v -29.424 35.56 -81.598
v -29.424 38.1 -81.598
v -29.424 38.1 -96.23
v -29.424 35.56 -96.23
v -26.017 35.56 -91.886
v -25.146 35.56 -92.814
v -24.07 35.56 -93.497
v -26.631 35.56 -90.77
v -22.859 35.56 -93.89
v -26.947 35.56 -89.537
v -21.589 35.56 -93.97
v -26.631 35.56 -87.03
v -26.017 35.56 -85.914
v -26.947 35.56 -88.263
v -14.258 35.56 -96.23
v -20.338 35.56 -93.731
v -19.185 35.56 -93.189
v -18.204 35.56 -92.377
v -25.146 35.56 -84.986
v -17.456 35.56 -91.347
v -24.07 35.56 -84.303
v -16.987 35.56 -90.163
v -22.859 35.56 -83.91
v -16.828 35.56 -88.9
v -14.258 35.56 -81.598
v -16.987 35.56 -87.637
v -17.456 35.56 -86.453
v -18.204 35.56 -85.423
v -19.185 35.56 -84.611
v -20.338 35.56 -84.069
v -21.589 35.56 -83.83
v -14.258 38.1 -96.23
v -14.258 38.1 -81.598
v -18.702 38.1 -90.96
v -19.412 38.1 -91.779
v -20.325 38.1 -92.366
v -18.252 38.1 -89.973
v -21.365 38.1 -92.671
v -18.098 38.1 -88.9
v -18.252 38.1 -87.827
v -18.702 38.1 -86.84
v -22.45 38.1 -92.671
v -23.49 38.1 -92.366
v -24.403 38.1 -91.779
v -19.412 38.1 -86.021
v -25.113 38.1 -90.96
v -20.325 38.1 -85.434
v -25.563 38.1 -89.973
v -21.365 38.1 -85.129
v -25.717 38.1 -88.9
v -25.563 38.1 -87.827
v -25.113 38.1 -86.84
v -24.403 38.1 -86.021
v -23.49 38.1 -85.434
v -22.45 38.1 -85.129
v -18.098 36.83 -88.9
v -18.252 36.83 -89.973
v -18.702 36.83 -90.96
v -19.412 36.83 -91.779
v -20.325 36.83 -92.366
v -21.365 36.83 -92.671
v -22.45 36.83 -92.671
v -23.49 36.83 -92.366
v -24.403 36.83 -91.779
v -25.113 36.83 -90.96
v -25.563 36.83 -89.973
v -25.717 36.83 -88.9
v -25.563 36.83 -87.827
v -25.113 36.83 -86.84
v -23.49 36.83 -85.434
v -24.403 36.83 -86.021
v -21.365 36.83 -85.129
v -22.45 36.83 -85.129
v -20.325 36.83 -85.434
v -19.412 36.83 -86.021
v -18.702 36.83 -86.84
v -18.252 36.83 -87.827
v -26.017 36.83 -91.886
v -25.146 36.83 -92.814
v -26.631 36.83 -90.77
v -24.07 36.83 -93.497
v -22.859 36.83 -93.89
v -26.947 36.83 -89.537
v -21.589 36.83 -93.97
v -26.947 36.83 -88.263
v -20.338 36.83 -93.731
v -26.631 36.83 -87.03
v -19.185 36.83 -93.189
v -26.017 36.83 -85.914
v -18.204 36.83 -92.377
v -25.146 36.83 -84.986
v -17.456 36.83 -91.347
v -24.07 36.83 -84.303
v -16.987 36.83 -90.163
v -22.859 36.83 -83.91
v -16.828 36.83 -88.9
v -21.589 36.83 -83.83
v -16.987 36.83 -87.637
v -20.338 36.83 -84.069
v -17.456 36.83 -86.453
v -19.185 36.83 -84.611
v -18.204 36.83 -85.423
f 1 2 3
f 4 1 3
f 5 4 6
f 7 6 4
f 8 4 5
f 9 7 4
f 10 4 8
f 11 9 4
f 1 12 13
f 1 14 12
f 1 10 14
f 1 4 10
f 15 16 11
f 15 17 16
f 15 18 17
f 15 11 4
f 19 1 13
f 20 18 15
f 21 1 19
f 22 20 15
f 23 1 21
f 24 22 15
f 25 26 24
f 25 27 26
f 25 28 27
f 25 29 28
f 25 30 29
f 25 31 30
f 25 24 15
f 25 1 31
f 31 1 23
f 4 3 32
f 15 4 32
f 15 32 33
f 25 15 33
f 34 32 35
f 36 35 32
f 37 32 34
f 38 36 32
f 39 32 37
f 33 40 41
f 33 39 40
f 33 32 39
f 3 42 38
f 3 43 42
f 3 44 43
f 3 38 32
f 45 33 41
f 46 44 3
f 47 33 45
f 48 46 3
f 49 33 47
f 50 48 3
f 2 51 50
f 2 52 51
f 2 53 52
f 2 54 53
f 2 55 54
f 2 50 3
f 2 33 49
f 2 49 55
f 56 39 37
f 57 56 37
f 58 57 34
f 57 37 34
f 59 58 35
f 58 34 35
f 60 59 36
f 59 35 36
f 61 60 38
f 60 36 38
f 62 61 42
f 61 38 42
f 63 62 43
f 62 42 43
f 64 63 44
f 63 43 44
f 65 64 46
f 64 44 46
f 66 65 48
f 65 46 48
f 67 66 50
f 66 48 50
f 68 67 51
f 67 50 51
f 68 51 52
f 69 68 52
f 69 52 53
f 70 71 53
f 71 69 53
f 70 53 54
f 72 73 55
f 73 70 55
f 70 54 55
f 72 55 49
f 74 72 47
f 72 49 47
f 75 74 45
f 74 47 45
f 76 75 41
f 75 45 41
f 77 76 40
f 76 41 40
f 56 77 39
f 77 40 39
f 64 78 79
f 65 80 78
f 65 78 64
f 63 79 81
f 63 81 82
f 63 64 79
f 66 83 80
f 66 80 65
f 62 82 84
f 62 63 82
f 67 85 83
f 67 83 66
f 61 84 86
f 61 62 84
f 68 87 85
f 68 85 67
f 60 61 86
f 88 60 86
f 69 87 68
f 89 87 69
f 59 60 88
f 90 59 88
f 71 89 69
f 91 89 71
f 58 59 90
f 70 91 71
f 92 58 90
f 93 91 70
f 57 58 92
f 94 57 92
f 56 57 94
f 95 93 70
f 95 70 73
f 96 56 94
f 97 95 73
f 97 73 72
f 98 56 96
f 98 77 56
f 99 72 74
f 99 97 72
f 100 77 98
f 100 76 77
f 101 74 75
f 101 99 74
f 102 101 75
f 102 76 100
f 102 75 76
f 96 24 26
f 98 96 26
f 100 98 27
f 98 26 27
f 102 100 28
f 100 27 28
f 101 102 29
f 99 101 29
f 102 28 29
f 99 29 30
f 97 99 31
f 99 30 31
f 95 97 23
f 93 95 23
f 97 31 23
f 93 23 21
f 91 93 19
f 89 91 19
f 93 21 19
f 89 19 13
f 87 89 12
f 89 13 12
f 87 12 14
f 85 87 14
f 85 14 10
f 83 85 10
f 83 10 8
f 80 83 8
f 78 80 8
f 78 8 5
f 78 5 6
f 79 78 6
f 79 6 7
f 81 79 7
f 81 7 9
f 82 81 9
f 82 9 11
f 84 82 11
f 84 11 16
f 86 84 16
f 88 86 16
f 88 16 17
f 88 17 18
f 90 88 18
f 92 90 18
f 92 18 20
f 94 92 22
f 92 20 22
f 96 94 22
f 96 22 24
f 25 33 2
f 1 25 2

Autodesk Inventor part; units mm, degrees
ref_plane "YZ Plane" through (0, 0, 0) normal (1, 0, 0) x (0, 1, 0)
ref_plane "XZ Plane" through (0, 0, 0) normal (0, 1, 0) x (-1, 0, 0)
ref_plane "XY Plane" through (0, 0, 0) normal (0, 0, 1) x (1, 0, 0)
sketch "Sketch1" plane through (0, 0, 0) normal (0, 1, 0) x (-1, 0, 0)
  line L0 (0, 0) -> (177.8, 0)
  line L1 (177.8, 0) -> (177.8, -114.3)
  line L2 (177.8, -114.3) -> (0, -114.3)
  line L3 (0, -114.3) -> (0, 0)
  dimension "d0" = 177.8
  dimension "d1" = 114.3
extrude "Extrusion1" add sketch "Sketch1" along normal blind 38.1
sketch "Sketch2" plane through (0, 0, 0) normal (0, -1, 0) x (1, 0, 0)
  line L0 (-177.8, -114.3) -> (-177.8, 0) projected
  line L1 (0, 0) -> (-177.8, 0)
  line L2 (-177.8, 0) -> (-177.8, -114.3)
  line L3 (-177.8, -114.3) -> (0, -114.3)
  line L4 (0, -114.3) -> (0, 0)
  line L5 (-5.08, -5.08) -> (-172.72, -5.08)
  line L6 (-172.72, -5.08) -> (-172.72, -109.22)
  line L7 (-172.72, -109.22) -> (-5.08, -109.22)
  line L8 (-5.08, -109.22) -> (-5.08, -5.08)
  dimension "d4" = 5.08
extrude "Extrusion2" cut sketch "Sketch2" against normal blind 35.56 contours L8 L7 L6 L5
fillet "Fillet1" radius 3.175 4 edges at (-177.8, 38.1, -57.15) (-88.9, 38.1, 0) (-88.9, 38.1, -114.3) (0, 38.1, -57.15)
sketch "Sketch3" plane through (0, 38.1, 0) normal (0, 1, 0) x (1, 0, 0)
  line L0 (-177.8, 114.3) -> (-171.45, 114.3)
  line L1 (-171.45, 114.3) -> (-171.45, 0)
  line L2 (-171.45, 0) -> (-177.8, 0)
  line L3 (-177.8, 0) -> (-177.8, 114.3)
  line L4 (0, 114.3) -> (-177.8, 114.3) projected
  line L5 (-177.8, 114.3) -> (0, 114.3)
  line L6 (0, 114.3) -> (0, 107.95)
  line L7 (0, 107.95) -> (-177.8, 107.95)
  line L8 (-177.8, 107.95) -> (-177.8, 114.3)
  line L9 (-158.75, 100.4887) -> (-100.6475, 100.4887)
  line L10 (-100.6475, 100.4887) -> (-100.6475, 13.8112)
  line L11 (-100.6475, 13.8112) -> (-158.75, 13.8112)
  line L12 (-158.75, 13.8112) -> (-158.75, 100.4887)
  point P0 (0, 0)
  dimension "d8" = 6.35
  dimension "d9" = 6.35
  dimension "d10" = 58.1025
  dimension "d11" = 86.6775
  dimension "d12" = 13.8112
  dimension "d13" = 19.05
extrude "Extrusion3" cut sketch "Sketch3" against normal blind 35.56 contours L9 L10 L11 L12
sketch "Sketch4" plane through (0, 38.1, 0) normal (0, 1, 0) x (1, 0, 0)
  line L0 (-94.2975, 17.78) -> (-81.2088, 17.78)
  line L1 (-91.7575, 20.32) -> (-91.7575, 26.67)
  line L2 (-91.7575, 26.67) -> (-94.2975, 26.67)
  line L3 (-94.2975, 26.67) -> (-94.2975, 17.78)
  line L4 (-94.2975, 17.78) -> (-78.6765, 17.78)
  line L5 (-78.6765, 17.78) -> (-78.6765, 20.32)
  line L6 (-94.2975, 24.2647) -> (-94.2975, 17.78)
  line L7 (-85.6615, 20.32) -> (-85.6615, 24.13)
  line L8 (-85.6615, 24.13) -> (-88.2015, 24.13)
  line L9 (-88.2015, 24.13) -> (-88.2015, 20.32)
  line L10 (-78.6765, 20.32) -> (-85.6615, 20.32)
  line L11 (-88.2015, 20.32) -> (-91.7575, 20.32)
  line L12 (-100.6475, 100.4887) -> (-100.6475, 13.8112) projected
  line L13 (-177.8, 0) -> (0, 0) projected
  line L14 (-94.2975, 27.94) -> (-78.6765, 27.94)
  line L15 (-78.6765, 27.94) -> (-78.6765, 30.7699)
  line L16 (-81.2165, 30.48) -> (-94.2975, 30.48)
  line L17 (-94.2975, 30.48) -> (-94.2975, 27.94)
  line L18 (-83.0828, 27.94) -> (-78.6765, 27.94)
  line L19 (-78.6765, 27.94) -> (-78.6765, 36.83)
  line L20 (-78.6765, 36.83) -> (-81.2165, 36.83)
  line L21 (-81.2165, 36.83) -> (-81.2165, 30.48)
  ellipse E0 centre (-86.487, 41.91) end of major axis (-94.2975, 41.91) minor radius 5.334
  ellipse E1 centre (-86.487, 53.34) end of major axis (-94.2975, 53.34) minor radius 5.334
  line L22 (-94.2975, 60.96) -> (-78.6765, 60.96)
  line L23 (-78.6765, 60.96) -> (-78.6765, 63.754)
  line L24 (-94.2975, 63.754) -> (-94.2975, 60.96)
  ellipse E2 centre (-86.487, 63.754) end of major axis (-94.2975, 63.754) minor radius 7.62 (-78.6765, 63.754) -> (-94.2975, 63.754) ccw
  line L25 (-91.7575, 63.754) -> (-91.7575, 63.5)
  line L26 (-91.7575, 63.5) -> (-81.2165, 63.5)
  line L27 (-81.2165, 63.5) -> (-81.2165, 63.754)
  line L28 (-94.2975, 82.55) -> (-78.6765, 82.55)
  line L29 (-78.6765, 82.55) -> (-78.6765, 80.01)
  line L30 (-78.6765, 80.01) -> (-94.2975, 80.01)
  line L31 (-94.2975, 80.01) -> (-94.2975, 82.55)
  line L32 (-91.7575, 89.535) -> (-78.6765, 89.535)
  line L33 (-78.6765, 89.535) -> (-78.6765, 92.075)
  line L34 (-78.6765, 92.075) -> (-91.7575, 92.075)
  line L35 (-94.2975, 94.8241) -> (-94.2975, 91.9305)
  line L36 (-94.2975, 85.09) -> (-91.7575, 85.09)
  line L37 (-91.7575, 96.52) -> (-94.2975, 96.52)
  line L38 (-94.2975, 96.52) -> (-94.2975, 85.09)
  line L39 (-91.7575, 85.09) -> (-91.7575, 89.535)
  line L40 (-91.7575, 92.075) -> (-91.7575, 96.52)
  spline S0 degree 5 poles (-91.7575, 41.91) (-91.7584, 41.6813) (-91.6944, 41.4527) (-91.5885, 41.2473) (-91.2042, 40.6846) (-90.6636, 40.2564) (-90.282, 40.0177) (-89.3306, 39.5478) (-88.3046, 39.2718) (-87.7026, 39.1679) (-86.487, 39.0641) (-85.2714, 39.1679) (-84.6694, 39.2718) (-83.6435, 39.5478) (-82.692, 40.0176) (-82.3107, 40.2563) (-81.7696, 40.6845) (-81.3858, 41.2473) (-81.2787, 41.4526) (-81.1539, 41.91) (-81.2787, 42.3674) (-81.3858, 42.5727) (-81.7696, 43.1355) (-82.3107, 43.5637) (-82.692, 43.8024) (-83.6435, 44.2722) (-84.6694, 44.5482) (-85.2714, 44.6521) (-86.487, 44.7559) (-87.7026, 44.6521) (-88.3046, 44.5482) (-89.3306, 44.2722) (-90.282, 43.8023) (-90.6636, 43.5636) (-91.2042, 43.1354) (-91.5885, 42.5727) (-91.6944, 42.3673) (-91.7584, 42.1387) (-91.7575, 41.91) knots 0 0 0 0 0 0 0.044471 0.044471 0.044471 0.131758 0.131758 0.131758 0.25 0.25 0.25 0.36824 0.36824 0.36824 0.455522 0.455522 0.455522 0.5 0.5 0.5 0.544478 0.544478 0.544478 0.63176 0.63176 0.63176 0.75 0.75 0.75 0.868242 0.868242 0.868242 0.955529 0.955529 0.955529 1 1 1 1 1 1
  spline S1 degree 5 poles (-91.7575, 53.34) (-91.7584, 53.1113) (-91.6944, 52.8827) (-91.5885, 52.6773) (-91.2042, 52.1146) (-90.6636, 51.6864) (-90.282, 51.4477) (-89.3306, 50.9778) (-88.3046, 50.7018) (-87.7026, 50.5979) (-86.487, 50.4941) (-85.2714, 50.5979) (-84.6694, 50.7018) (-83.6435, 50.9778) (-82.692, 51.4476) (-82.3107, 51.6863) (-81.7696, 52.1145) (-81.3858, 52.6773) (-81.2787, 52.8826) (-81.1539, 53.34) (-81.2787, 53.7974) (-81.3858, 54.0027) (-81.7696, 54.5655) (-82.3107, 54.9937) (-82.692, 55.2324) (-83.6435, 55.7022) (-84.6694, 55.9782) (-85.2714, 56.0821) (-86.487, 56.1859) (-87.7026, 56.0821) (-88.3046, 55.9782) (-89.3306, 55.7022) (-90.282, 55.2323) (-90.6636, 54.9936) (-91.2042, 54.5654) (-91.5885, 54.0027) (-91.6944, 53.7973) (-91.7584, 53.5687) (-91.7575, 53.34) knots 0 0 0 0 0 0 0.044471 0.044471 0.044471 0.131758 0.131758 0.131758 0.25 0.25 0.25 0.36824 0.36824 0.36824 0.455522 0.455522 0.455522 0.5 0.5 0.5 0.544478 0.544478 0.544478 0.63176 0.63176 0.63176 0.75 0.75 0.75 0.868242 0.868242 0.868242 0.955529 0.955529 0.955529 1 1 1 1 1 1
  spline S2 degree 5 poles (-81.2165, 63.754) (-81.2166, 64.309) (-81.2953, 64.8639) (-81.4525, 65.404) (-82.1282, 66.8995) (-83.3585, 68.0474) (-84.3453, 68.5716) (-86.487, 69.0964) (-88.6287, 68.5716) (-89.6155, 68.0474) (-90.8458, 66.8995) (-91.5215, 65.404) (-91.6787, 64.8639) (-91.7574, 64.309) (-91.7575, 63.754) knots 0 0 0 0 0 0 0.170659 0.170659 0.170659 0.5 0.5 0.5 0.829341 0.829341 0.829341 1 1 1 1 1 1
  point P0 (-94.2975, 93.3773)
  point P1 (-88.9, 0)
  point P2 (-93.0275, 85.09)
  dimension "d32" = 5.334
  dimension "d33" = 7.8105
  dimension "d36" = 7.8105
  dimension "d37" = 5.334
  dimension "d42" = 7.62
  dimension "d43" = 2.54
  dimension "d16" = 2.54
  dimension "d17" = 3.556
  dimension "d18" = 2.54
  dimension "d19" = 6.985
  dimension "d20" = 8.89
  dimension "d21" = 6.35
  dimension "d22" = 3.81
  dimension "d23" = 3.81
  dimension "d24" = 6.35
  dimension "d25" = 17.78
  dimension "d26" = 2.54
  dimension "d27" = 2.54
  dimension "d28" = 6.35
  dimension "d29" = 15.621
  dimension "d30" = 6.35
  dimension "d31" = 27.94
  dimension "d34" = 14.1605
  dimension "d35" = 41.91
  dimension "d38" = 14.1605
  dimension "d39" = 53.34
  dimension "d40" = 2.54
  dimension "d41" = 2.54
  dimension "d44" = 6.35
  dimension "d45" = 15.621
  dimension "d46" = 60.96
  dimension "d47" = 2.794
  dimension "d48" = 63.754
  dimension "d49" = 14.1605
  dimension "d50" = 2.54
  dimension "d51" = 15.621
  dimension "d52" = 4.445
  dimension "d53" = 4.445
  dimension "d54" = 2.54
  dimension "d55" = 2.54
  dimension "d56" = 6.35
  dimension "d57" = 80.01
  dimension "d58" = 2.54
  dimension "d59" = 13.081
  dimension "d62" = 3.9688
  dimension "d63" = 3.9688
extrude "Extrusion4" cut sketch "Sketch4" against normal blind 1.27
sketch "Sketch5" plane through (0, 38.1, 0) normal (0, 1, 0) x (1, 0, 0)
  line L0 (-43.4975, 22.6219) -> (-37.9413, 22.6219)
  line L1 (-37.9413, 22.6219) -> (-37.9413, 28.1781)
  line L2 (-37.9413, 28.1781) -> (-43.4975, 28.1781)
  line L3 (-43.4975, 28.1781) -> (-43.4975, 22.6219)
  line L4 (-43.4975, 38.4969) -> (-37.9413, 38.4969)
  line L5 (-37.9413, 38.4969) -> (-37.9413, 44.0531)
  line L6 (-37.9413, 44.0531) -> (-43.4975, 44.0531)
  line L7 (-43.4975, 44.0531) -> (-43.4975, 38.4969)
  line L8 (-43.4975, 54.3719) -> (-37.9413, 54.3719)
  line L9 (-37.9413, 54.3719) -> (-37.9413, 59.9281)
  line L10 (-37.9413, 59.9281) -> (-43.4975, 59.9281)
  line L11 (-43.4975, 59.9281) -> (-43.4975, 54.3719)
  line L12 (-43.4975, 70.2469) -> (-37.9413, 70.2469)
  line L13 (-37.9413, 70.2469) -> (-37.9413, 75.8031)
  line L14 (-37.9413, 75.8031) -> (-43.4975, 75.8031)
  line L15 (-43.4975, 75.8031) -> (-43.4975, 70.2469)
  line L16 (-43.4975, 86.1219) -> (-37.9413, 86.1219)
  line L17 (-37.9413, 86.1219) -> (-37.9413, 91.6781)
  line L18 (-37.9413, 91.6781) -> (-43.4975, 91.6781)
  line L19 (-43.4975, 91.6781) -> (-43.4975, 86.1219)
  line L20 (0, 114.3) -> (-177.8, 114.3) projected
  line L21 (-177.8, 0) -> (0, 0) projected
  line L22 (-100.6475, 100.4887) -> (-100.6475, 13.8112) projected
  circle A0 centre (-21.9075, 25.4) radius 3.81
  circle A1 centre (-21.9075, 41.275) radius 3.81
  circle A2 centre (-21.9075, 57.15) radius 3.81
  circle A3 centre (-21.9075, 73.025) radius 3.81
  circle A4 centre (-21.9075, 88.9) radius 3.81
  point P0 (-43.4975, 73.025)
  dimension "d64" = 5.5563
  dimension "d65" = 5.5563
  dimension "d66" = 5.5563
  dimension "d67" = 5.5563
  dimension "d68" = 5.5563
  dimension "d69" = 5.5563
  dimension "d70" = 15.875
  dimension "d71" = 15.875
  dimension "d72" = 15.875
  dimension "d73" = 15.875
  dimension "d74" = 22.6219
  dimension "d76" = 57.15
  dimension "d77" = 7.62
  dimension "d78" = 7.62
  dimension "d79" = 7.62
  dimension "d80" = 7.62
  dimension "d81" = 7.62
  dimension "d82" = 15.875
  dimension "d83" = 15.875
  dimension "d84" = 15.875
  dimension "d85" = 15.875
  dimension "d86" = 25.4
  dimension "d87" = 78.74
  dimension "d88" = 78.74
  dimension "d89" = 78.74
  dimension "d90" = 78.74
  dimension "d91" = 78.74
extrude "Extrusion5" cut sketch "Sketch5" against normal blind 25.4
sketch "Sketch6" plane through (0, 35.56, 0) normal (0, -1, 0) x (1, 0, 0)
  circle A0 centre (-21.9075, -88.9) radius 3.81 projected
  circle A1 centre (-21.9075, -88.9) radius 5.08
  circle A2 centre (-21.9075, -73.025) radius 3.81 projected
  circle A3 centre (-21.9075, -73.025) radius 5.08
  circle A4 centre (-21.9075, -57.15) radius 3.81 projected
  circle A5 centre (-21.9075, -57.15) radius 5.08
  circle A6 centre (-21.9075, -41.275) radius 3.81 projected
  circle A7 centre (-21.9075, -41.275) radius 5.08
  circle A8 centre (-21.9075, -25.4) radius 3.81 projected
  circle A9 centre (-21.9075, -25.4) radius 5.08
  line L0 (-43.4975, -59.9281) -> (-37.9413, -59.9281)
  line L1 (-37.9413, -59.9281) -> (-37.9413, -54.3719)
  line L2 (-37.9413, -54.3719) -> (-43.4975, -54.3719)
  line L3 (-43.4975, -54.3719) -> (-43.4975, -59.9281)
  line L4 (-45.4025, -61.8331) -> (-36.0363, -61.8331)
  line L5 (-36.0363, -61.8331) -> (-36.0363, -52.4669)
  line L6 (-36.0363, -52.4669) -> (-45.4025, -52.4669)
  line L7 (-45.4025, -52.4669) -> (-45.4025, -61.8331)
  line L8 (-43.4975, -91.6781) -> (-37.9413, -91.6781)
  line L9 (-37.9413, -91.6781) -> (-37.9413, -86.1219)
  line L10 (-37.9413, -86.1219) -> (-43.4975, -86.1219)
  line L11 (-43.4975, -86.1219) -> (-43.4975, -91.6781)
  line L12 (-43.4975, -75.8031) -> (-37.9413, -75.8031) projected
  line L13 (-37.9413, -70.2469) -> (-36.6713, -68.9769) projected
  line L14 (-43.4975, -75.8031) -> (-37.9413, -75.8031)
  line L15 (-37.9413, -75.8031) -> (-37.9413, -70.2469)
  line L16 (-37.9413, -70.2469) -> (-43.4975, -70.2469)
  line L17 (-43.4975, -70.2469) -> (-43.4975, -75.8031)
  line L18 (-43.4975, -38.4969) -> (-43.4975, -44.0531) projected
  line L19 (-43.4975, -44.0531) -> (-37.9413, -44.0531)
  line L20 (-37.9413, -44.0531) -> (-37.9413, -38.4969)
  line L21 (-37.9413, -38.4969) -> (-43.4975, -38.4969)
  line L22 (-43.4975, -38.4969) -> (-43.4975, -44.0531)
  line L23 (-37.9413, -28.1781) -> (-43.4975, -28.1781) projected
  line L24 (-37.9413, -22.6219) -> (-36.6713, -21.3519) projected
  line L25 (-43.4975, -28.1781) -> (-37.9413, -28.1781)
  line L26 (-37.9413, -28.1781) -> (-37.9413, -22.6219)
  line L27 (-37.9413, -22.6219) -> (-43.4975, -22.6219)
  line L28 (-43.4975, -22.6219) -> (-43.4975, -28.1781)
  line L29 (-45.4025, -77.7081) -> (-36.0363, -77.7081)
  line L30 (-36.0363, -77.7081) -> (-36.0363, -68.3419)
  line L31 (-36.0363, -68.3419) -> (-45.4025, -68.3419)
  line L32 (-45.4025, -68.3419) -> (-45.4025, -77.7081)
  line L33 (-45.4025, -84.2169) -> (-36.0362, -84.2169)
  line L34 (-36.0362, -84.2169) -> (-36.0362, -93.5831)
  line L35 (-36.0362, -93.5831) -> (-45.4025, -93.5831)
  line L36 (-45.4025, -93.5831) -> (-45.4025, -84.2169)
  line L37 (-36.0362, -45.9581) -> (-45.4025, -45.9581)
  line L38 (-45.4025, -45.9581) -> (-45.4025, -36.5919)
  line L39 (-45.4025, -36.5919) -> (-36.0362, -36.5919)
  line L40 (-36.0362, -36.5919) -> (-36.0362, -45.9581)
  line L41 (-45.4025, -30.0831) -> (-36.0363, -30.0831)
  line L42 (-36.0363, -30.0831) -> (-36.0363, -20.7169)
  line L43 (-36.0363, -20.7169) -> (-45.4025, -20.7169)
  line L44 (-45.4025, -20.7169) -> (-45.4025, -30.0831)
  line L45 (-48.3394, -99.6918) -> (-33.0994, -99.6918)
  line L46 (-33.0994, -99.6918) -> (-33.0994, -14.6018)
  line L47 (-33.0994, -14.6018) -> (-48.3394, -14.6018)
  line L48 (-48.3394, -14.6018) -> (-48.3394, -99.6918)
  point P0 (0, 0)
  point P1 (-43.4975, -38.4969)
  point P2 (-40.7194, -44.0531)
  point P3 (-40.7194, -91.6781)
  point P4 (-40.7194, -14.6018)
  dimension "d97" = 10.16
  dimension "d98" = 10.16
  dimension "d99" = 10.16
  dimension "d100" = 10.16
  dimension "d101" = 10.16
  dimension "d119" = 1.905
  dimension "d120" = 1.905
  dimension "d121" = 1.905
  dimension "d122" = 1.905
  dimension "d123" = 1.905
  dimension "d136" = 15.24
  dimension "d137" = 85.09
  dimension "d139" = 7.62
  dimension "d140" = 8.0137
  dimension "d141" = 8.02
extrude "Extrusion6" cut sketch "Sketch6" against normal blind 1.27 contours A1 | A3 | A5 | A7 | A9
extrude "Extrusion9" cut sketch "Sketch6" against normal blind 1.7463 contours L7 L6 L5 L4 | L32 L31 L30 L29 | L33 L34 L35 L36 | L37 L38 L39 L40 | L44 L43 L42 L41
sketch "Sketch8" plane through (0, 35.56, 0) normal (0, -1, 0) x (1, 0, 0)
  line L0 (-100.6475, -13.8112) -> (-100.6475, -100.4887) projected
  line L1 (-100.6475, -13.8112) -> (-158.75, -13.8112)
  line L2 (-158.75, -13.8112) -> (-158.75, -7.4613)
  line L3 (-158.75, -7.4613) -> (-100.6475, -7.4612)
  line L4 (-100.6475, -7.4612) -> (-100.6475, -13.8112)
  line L5 (-158.75, -100.4887) -> (-100.6475, -100.4887) projected
  line L6 (-100.6475, -100.4887) -> (-158.75, -100.4887)
  line L7 (-158.75, -100.4887) -> (-158.75, -107.4737)
  line L8 (-158.75, -107.4737) -> (-100.6475, -107.4737)
  line L9 (-100.6475, -107.4737) -> (-100.6475, -100.4887)
  line L10 (-100.6475, -7.4612) -> (-94.2975, -7.4612)
  line L11 (-94.2975, -7.4612) -> (-94.2975, -13.8112)
  line L12 (-94.2975, -13.8112) -> (-100.6475, -13.8112)
  line L13 (-100.6475, -13.8112) -> (-100.6475, -7.4612)
  line L14 (-100.6475, -100.4887) -> (-94.2975, -100.4887)
  line L15 (-94.2975, -100.4887) -> (-94.2975, -107.4737)
  line L16 (-94.2975, -107.4737) -> (-100.6475, -107.4737)
  line L17 (-100.6475, -107.4737) -> (-100.6475, -100.4887)
  line L18 (-158.75, -100.4887) -> (-165.1, -100.4887)
  line L19 (-165.1, -100.4887) -> (-165.1, -107.4737)
  line L20 (-165.1, -107.4737) -> (-158.75, -107.4737)
  line L21 (-158.75, -107.4737) -> (-158.75, -100.4887)
  line L22 (-158.75, -7.4613) -> (-165.1, -7.4613)
  line L23 (-165.1, -7.4613) -> (-165.1, -13.8112)
  line L24 (-165.1, -13.8112) -> (-158.75, -13.8112)
  line L25 (-158.75, -13.8112) -> (-158.75, -7.4613)
  line L26 (-102.4053, -9.0487) -> (-155.7453, -9.0487)
  line L27 (-155.7453, -9.0487) -> (-155.7453, -12.2237)
  line L28 (-155.7453, -12.2237) -> (-102.4053, -12.2237)
  line L29 (-102.4053, -12.2237) -> (-102.4053, -9.0487)
  point P0 (0, 0)
  dimension "d126" = 6.35
  dimension "d127" = 6.985
  dimension "d128" = 6.35
  dimension "d129" = 6.35
  dimension "d130" = 6.35
  dimension "d131" = 53.34
  dimension "d132" = 3.175
  dimension "d133" = 1.5875
extrude "Extrusion10" cut sketch "Sketch8" against normal blind 1.27 contours L29 L28 L27 L26
extrude "Extrusion11" cut sketch "Sketch6" against normal blind 0.9525 contours L48 L47 L46 L45
sketch "Sketch9" plane through (-177.8, 0, 0) normal (0, 0, 1) x (1, 0, 0)
  line L0 (77.1525, 35.56) -> (19.05, 35.56) projected
  line L1 (172.72, 0) -> (5.08, 0) projected
  line L2 (77.1525, 35.56) -> (127.9525, 35.56)
  line L3 (127.9525, 35.56) -> (127.9525, 0)
  line L4 (127.9525, 0) -> (77.1525, 0)
  line L5 (77.1525, 0) -> (77.1525, 35.56)
  line L6 (86.0425, 17.145) -> (106.68, 17.145)
  line L7 (106.68, 17.145) -> (106.68, 15.0495)
  line L8 (106.68, 15.0495) -> (86.0425, 15.0495)
  line L9 (86.0425, 15.0495) -> (86.0425, 17.145)
  line L10 (88.5825, 15.0495) -> (97.4725, 15.0495)
  line L11 (97.4725, 15.0495) -> (97.4725, 11.2395)
  line L12 (97.4725, 11.2395) -> (88.5825, 11.2395)
  line L13 (88.5825, 11.2395) -> (88.5825, 15.0495)
  line L14 (0, 34.925) -> (177.8, 34.925) projected
  line L15 (0, 0) -> (0, 34.925) projected
  line L16 (177.8, 0) -> (177.8, 34.925) projected
  point P0 (97.4725, 15.0495)
  dimension "d144" = 50.8
  dimension "d145" = 20.6375
  dimension "d146" = 2.0955
  dimension "d147" = 8.89
  dimension "d148" = 3.81
  dimension "d149" = 2.54
  dimension "d150" = 17.78
  dimension "d187" = 71.12
extrude "Extrusion12" cut sketch "Sketch9" against normal blind 5.08 contours L6 L7 L8 L9 | L8 L11 L12 L13
sketch "Sketch10" plane through (-5.08, 0, -5.08) normal (0, 0, -1) x (-1, 0, 0)
  line L0 (84.1375, 11.2395) -> (75.2475, 11.2395) projected
  line L1 (84.1375, 15.0495) -> (86.6775, 15.0495) projected
  line L2 (75.2475, 11.2395) -> (84.1375, 11.2395)
  line L3 (84.1375, 11.2395) -> (84.1375, 15.0495)
  line L4 (75.2475, 15.0495) -> (75.2475, 11.2395)
  line L5 (75.2475, 15.0495) -> (66.04, 15.0495) projected
  line L6 (86.6775, 17.145) -> (86.6775, 15.0495) projected
  line L7 (86.6775, 15.0495) -> (86.6775, 17.145)
  line L8 (86.6775, 17.145) -> (66.04, 17.145)
  line L9 (66.04, 17.145) -> (66.04, 15.0495)
  line L10 (66.04, 15.0495) -> (75.2475, 15.0495)
  line L11 (84.1375, 15.0495) -> (86.6775, 15.0495)
  line L12 (73.3425, 9.3345) -> (86.0425, 9.3345)
  line L13 (86.0425, 9.3345) -> (86.0425, 13.1445)
  line L14 (86.0425, 13.1445) -> (88.5825, 13.1445)
  line L15 (88.5825, 13.1445) -> (88.5825, 19.05)
  line L16 (88.5825, 19.05) -> (64.135, 19.05)
  line L17 (64.135, 19.05) -> (64.135, 13.1445)
  line L18 (64.135, 13.1445) -> (73.3425, 13.1445)
  line L19 (73.3425, 13.1445) -> (73.3425, 9.3345)
  line L20 (73.3425, 13.1445) -> (73.3425, 15.0495)
  line L21 (86.0425, 13.1445) -> (86.0425, 15.0495)
  point P0 (-5.08, 0)
  dimension "d153" = 1.905
extrude "Extrusion13" cut sketch "Sketch10" against normal blind 3.175 contours L3 L1 L21 L13 L12 L19 L20 L5 L4 L0 | L1 L6 L8 L9 L5 L20 L18 L17 L16 L15 L14 L21
sketch "Sketch11" plane through (0, 0, -114.3) normal (0, 0, -1) x (-1, 0, 0)
  line L0 (63.5, 23.495) -> (76.2, 23.495)
  line L1 (76.2, 23.495) -> (76.2, 15.875)
  line L2 (76.2, 15.875) -> (63.5, 15.875)
  line L3 (63.5, 15.875) -> (63.5, 23.495)
  line L4 (0, 0) -> (0, 34.925) projected
  circle A0 centre (69.85, 19.685) radius 3.81
  line L5 (0, 34.925) -> (177.8, 34.925) projected
  dimension "d156" = 7.62
  dimension "d157" = 63.5
  dimension "d158" = 12.7
  dimension "d164" = 11.43
  dimension "d165" = 15.24
extrude "Extrusion14" cut sketch "Sketch11" against normal blind 6.35 contours A0
sketch "Sketch12" plane through (-172.72, 0, -109.22) normal (0, 0, 1) x (1, 0, 0)
  line L0 (96.52, 15.875) -> (109.22, 15.875)
  line L1 (109.22, 15.875) -> (109.22, 23.495)
  line L2 (109.22, 23.495) -> (96.52, 23.495)
  line L3 (96.52, 23.495) -> (96.52, 15.875)
  circle A0 centre (102.87, 19.685) radius 3.81 projected
  line L4 (96.52, 15.875) -> (109.22, 23.495) construction
  line L5 (109.22, 15.875) -> (96.52, 23.495) construction
  point P0 (172.72, 0)
  point P1 (102.87, 15.875)
  point P2 (102.87, 23.495)
  dimension "d161" = 12.7
extrude "Extrusion15" cut sketch "Sketch12" against normal blind 2.0574 contours L3 L2 A0 L0 | A0 L2 L1 L0
sketch "Sketch13" plane through (0, 35.56, 0) normal (0, -1, 0) x (1, 0, 0)
  line L0 (-48.3394, -99.6918) -> (-48.3394, -14.6018) projected
  line L1 (-48.3394, -31.1933) -> (-46.4344, -31.1933)
  line L2 (-46.4344, -31.1933) -> (-46.4344, -36.2733)
  line L3 (-46.4344, -36.2733) -> (-48.3394, -36.2733)
  line L4 (-48.3394, -36.2733) -> (-48.3394, -31.1933)
  line L5 (-33.0994, -14.6018) -> (-33.0994, -99.6918) projected
  line L6 (-33.0994, -36.2733) -> (-35.0044, -36.2733)
  line L7 (-35.0044, -36.2733) -> (-35.0044, -31.1933)
  line L8 (-35.0044, -31.1933) -> (-33.0994, -31.1933)
  line L9 (-33.0994, -31.1933) -> (-33.0994, -36.2733)
  line L10 (-46.4344, -31.1933) -> (-51.5144, -31.1933)
  line L11 (-51.5144, -31.1933) -> (-51.5144, -36.2733)
  line L12 (-51.5144, -36.2733) -> (-46.4344, -36.2733)
  line L13 (-46.4344, -36.2733) -> (-46.4344, -31.1933)
  line L14 (-35.0044, -31.1933) -> (-29.9244, -31.1933)
  line L15 (-29.9244, -31.1933) -> (-29.9244, -36.2733)
  line L16 (-29.9244, -36.2733) -> (-35.0044, -36.2733)
  line L17 (-35.0044, -36.2733) -> (-35.0044, -31.1933)
  line L18 (-48.3394, -78.5039) -> (-46.4344, -78.5039)
  line L19 (-46.4344, -78.5039) -> (-46.4344, -83.5839)
  line L20 (-46.4344, -83.5839) -> (-48.3394, -83.5839)
  line L21 (-48.3394, -83.5839) -> (-48.3394, -78.5039)
  line L22 (-33.0994, -78.5039) -> (-35.0044, -78.5039)
  line L23 (-35.0044, -78.5039) -> (-35.0044, -83.5839)
  line L24 (-35.0044, -83.5839) -> (-33.0994, -83.5839)
  line L25 (-33.0994, -83.5839) -> (-33.0994, -78.5039)
  line L26 (-46.4344, -78.5039) -> (-51.5144, -78.5039)
  line L27 (-51.5144, -78.5039) -> (-51.5144, -83.5839)
  line L28 (-51.5144, -83.5839) -> (-46.4344, -83.5839)
  line L29 (-46.4344, -83.5839) -> (-46.4344, -78.5039)
  line L30 (-35.0044, -78.5039) -> (-29.9244, -78.5039)
  line L31 (-29.9244, -78.5039) -> (-29.9244, -83.5839)
  line L32 (-29.9244, -83.5839) -> (-35.0044, -83.5839)
  line L33 (-35.0044, -83.5839) -> (-35.0044, -78.5039)
  point P0 (0, 0)
  dimension "d166" = 5.08
  dimension "d167" = 5.08
  dimension "d168" = 5.08
  dimension "d169" = 1.905
  dimension "d170" = 1.905
  dimension "d171" = 1.905
  dimension "d172" = 1.905
  dimension "d173" = 5.08
  dimension "d174" = 5.08
  dimension "d175" = 5.08
  dimension "d176" = 5.08
extrude "Extrusion16" add sketch "Sketch13" along normal blind 1.905
fillet "Fillet2" radius 3.175 4 edges at (-29.9244, 33.655, -81.0439) (-51.5144, 33.655, -81.0439) (-29.9244, 33.655, -33.7333) (-51.5144, 33.655, -33.7333)
sketch "Sketch14" plane through (-46.4344, 35.56, -36.2733) normal (0, 0, -1) x (-1, 0, 0)
  line L0 (1.905, 0) -> (0, 0) projected
  line L1 (0, 0) -> (0, -1.905) projected
  line L2 (1.905, 0) -> (0, 0)
  line L3 (0, 0) -> (0, -0.9525)
  line L4 (0, -0.9525) -> (1.905, -0.9525)
  line L5 (1.905, -0.9525) -> (1.905, 0)
  line L6 (-11.43, 0) -> (-13.335, 0) projected
  line L7 (-13.335, 0) -> (-11.43, 0)
  line L8 (-11.43, 0) -> (-11.43, -0.9525)
  line L9 (-11.43, -0.9525) -> (-13.335, -0.9525)
  line L10 (-13.335, -0.9525) -> (-13.335, 0)
  point P0 (-46.4344, -35.56)
  point P1 (-11.43, 0)
  dimension "d180" = 0.9525
  dimension "d181" = 0.9525
extrude "Extrusion17" cut sketch "Sketch14" along normal blind 50.8 and the other way blind 12.7
sketch "Sketch15" plane through (0, 38.1, 0) normal (0, 1, 0) x (1, 0, 0)
  line L0 (-29.4242, 96.2295) -> (-14.2582, 96.2295)
  line L1 (-14.2582, 96.2295) -> (-14.2582, 81.5975)
  line L2 (-14.2582, 81.5975) -> (-29.4242, 81.5975)
  line L3 (-29.4242, 81.5975) -> (-29.4242, 96.2295)
  line L4 (-199.3478, 132.7561) -> (16.3943, 132.7561)
  line L5 (16.3943, 132.7561) -> (16.3943, -7.6898)
  line L6 (16.3943, -7.6898) -> (-199.3478, -7.6898)
  line L7 (-199.3478, -7.6898) -> (-199.3478, 132.7561)
  point P0 (0, 0)
extrude "Extrusion18" cut sketch "Sketch15" against normal blind 127
properties part number "Button_slot"
